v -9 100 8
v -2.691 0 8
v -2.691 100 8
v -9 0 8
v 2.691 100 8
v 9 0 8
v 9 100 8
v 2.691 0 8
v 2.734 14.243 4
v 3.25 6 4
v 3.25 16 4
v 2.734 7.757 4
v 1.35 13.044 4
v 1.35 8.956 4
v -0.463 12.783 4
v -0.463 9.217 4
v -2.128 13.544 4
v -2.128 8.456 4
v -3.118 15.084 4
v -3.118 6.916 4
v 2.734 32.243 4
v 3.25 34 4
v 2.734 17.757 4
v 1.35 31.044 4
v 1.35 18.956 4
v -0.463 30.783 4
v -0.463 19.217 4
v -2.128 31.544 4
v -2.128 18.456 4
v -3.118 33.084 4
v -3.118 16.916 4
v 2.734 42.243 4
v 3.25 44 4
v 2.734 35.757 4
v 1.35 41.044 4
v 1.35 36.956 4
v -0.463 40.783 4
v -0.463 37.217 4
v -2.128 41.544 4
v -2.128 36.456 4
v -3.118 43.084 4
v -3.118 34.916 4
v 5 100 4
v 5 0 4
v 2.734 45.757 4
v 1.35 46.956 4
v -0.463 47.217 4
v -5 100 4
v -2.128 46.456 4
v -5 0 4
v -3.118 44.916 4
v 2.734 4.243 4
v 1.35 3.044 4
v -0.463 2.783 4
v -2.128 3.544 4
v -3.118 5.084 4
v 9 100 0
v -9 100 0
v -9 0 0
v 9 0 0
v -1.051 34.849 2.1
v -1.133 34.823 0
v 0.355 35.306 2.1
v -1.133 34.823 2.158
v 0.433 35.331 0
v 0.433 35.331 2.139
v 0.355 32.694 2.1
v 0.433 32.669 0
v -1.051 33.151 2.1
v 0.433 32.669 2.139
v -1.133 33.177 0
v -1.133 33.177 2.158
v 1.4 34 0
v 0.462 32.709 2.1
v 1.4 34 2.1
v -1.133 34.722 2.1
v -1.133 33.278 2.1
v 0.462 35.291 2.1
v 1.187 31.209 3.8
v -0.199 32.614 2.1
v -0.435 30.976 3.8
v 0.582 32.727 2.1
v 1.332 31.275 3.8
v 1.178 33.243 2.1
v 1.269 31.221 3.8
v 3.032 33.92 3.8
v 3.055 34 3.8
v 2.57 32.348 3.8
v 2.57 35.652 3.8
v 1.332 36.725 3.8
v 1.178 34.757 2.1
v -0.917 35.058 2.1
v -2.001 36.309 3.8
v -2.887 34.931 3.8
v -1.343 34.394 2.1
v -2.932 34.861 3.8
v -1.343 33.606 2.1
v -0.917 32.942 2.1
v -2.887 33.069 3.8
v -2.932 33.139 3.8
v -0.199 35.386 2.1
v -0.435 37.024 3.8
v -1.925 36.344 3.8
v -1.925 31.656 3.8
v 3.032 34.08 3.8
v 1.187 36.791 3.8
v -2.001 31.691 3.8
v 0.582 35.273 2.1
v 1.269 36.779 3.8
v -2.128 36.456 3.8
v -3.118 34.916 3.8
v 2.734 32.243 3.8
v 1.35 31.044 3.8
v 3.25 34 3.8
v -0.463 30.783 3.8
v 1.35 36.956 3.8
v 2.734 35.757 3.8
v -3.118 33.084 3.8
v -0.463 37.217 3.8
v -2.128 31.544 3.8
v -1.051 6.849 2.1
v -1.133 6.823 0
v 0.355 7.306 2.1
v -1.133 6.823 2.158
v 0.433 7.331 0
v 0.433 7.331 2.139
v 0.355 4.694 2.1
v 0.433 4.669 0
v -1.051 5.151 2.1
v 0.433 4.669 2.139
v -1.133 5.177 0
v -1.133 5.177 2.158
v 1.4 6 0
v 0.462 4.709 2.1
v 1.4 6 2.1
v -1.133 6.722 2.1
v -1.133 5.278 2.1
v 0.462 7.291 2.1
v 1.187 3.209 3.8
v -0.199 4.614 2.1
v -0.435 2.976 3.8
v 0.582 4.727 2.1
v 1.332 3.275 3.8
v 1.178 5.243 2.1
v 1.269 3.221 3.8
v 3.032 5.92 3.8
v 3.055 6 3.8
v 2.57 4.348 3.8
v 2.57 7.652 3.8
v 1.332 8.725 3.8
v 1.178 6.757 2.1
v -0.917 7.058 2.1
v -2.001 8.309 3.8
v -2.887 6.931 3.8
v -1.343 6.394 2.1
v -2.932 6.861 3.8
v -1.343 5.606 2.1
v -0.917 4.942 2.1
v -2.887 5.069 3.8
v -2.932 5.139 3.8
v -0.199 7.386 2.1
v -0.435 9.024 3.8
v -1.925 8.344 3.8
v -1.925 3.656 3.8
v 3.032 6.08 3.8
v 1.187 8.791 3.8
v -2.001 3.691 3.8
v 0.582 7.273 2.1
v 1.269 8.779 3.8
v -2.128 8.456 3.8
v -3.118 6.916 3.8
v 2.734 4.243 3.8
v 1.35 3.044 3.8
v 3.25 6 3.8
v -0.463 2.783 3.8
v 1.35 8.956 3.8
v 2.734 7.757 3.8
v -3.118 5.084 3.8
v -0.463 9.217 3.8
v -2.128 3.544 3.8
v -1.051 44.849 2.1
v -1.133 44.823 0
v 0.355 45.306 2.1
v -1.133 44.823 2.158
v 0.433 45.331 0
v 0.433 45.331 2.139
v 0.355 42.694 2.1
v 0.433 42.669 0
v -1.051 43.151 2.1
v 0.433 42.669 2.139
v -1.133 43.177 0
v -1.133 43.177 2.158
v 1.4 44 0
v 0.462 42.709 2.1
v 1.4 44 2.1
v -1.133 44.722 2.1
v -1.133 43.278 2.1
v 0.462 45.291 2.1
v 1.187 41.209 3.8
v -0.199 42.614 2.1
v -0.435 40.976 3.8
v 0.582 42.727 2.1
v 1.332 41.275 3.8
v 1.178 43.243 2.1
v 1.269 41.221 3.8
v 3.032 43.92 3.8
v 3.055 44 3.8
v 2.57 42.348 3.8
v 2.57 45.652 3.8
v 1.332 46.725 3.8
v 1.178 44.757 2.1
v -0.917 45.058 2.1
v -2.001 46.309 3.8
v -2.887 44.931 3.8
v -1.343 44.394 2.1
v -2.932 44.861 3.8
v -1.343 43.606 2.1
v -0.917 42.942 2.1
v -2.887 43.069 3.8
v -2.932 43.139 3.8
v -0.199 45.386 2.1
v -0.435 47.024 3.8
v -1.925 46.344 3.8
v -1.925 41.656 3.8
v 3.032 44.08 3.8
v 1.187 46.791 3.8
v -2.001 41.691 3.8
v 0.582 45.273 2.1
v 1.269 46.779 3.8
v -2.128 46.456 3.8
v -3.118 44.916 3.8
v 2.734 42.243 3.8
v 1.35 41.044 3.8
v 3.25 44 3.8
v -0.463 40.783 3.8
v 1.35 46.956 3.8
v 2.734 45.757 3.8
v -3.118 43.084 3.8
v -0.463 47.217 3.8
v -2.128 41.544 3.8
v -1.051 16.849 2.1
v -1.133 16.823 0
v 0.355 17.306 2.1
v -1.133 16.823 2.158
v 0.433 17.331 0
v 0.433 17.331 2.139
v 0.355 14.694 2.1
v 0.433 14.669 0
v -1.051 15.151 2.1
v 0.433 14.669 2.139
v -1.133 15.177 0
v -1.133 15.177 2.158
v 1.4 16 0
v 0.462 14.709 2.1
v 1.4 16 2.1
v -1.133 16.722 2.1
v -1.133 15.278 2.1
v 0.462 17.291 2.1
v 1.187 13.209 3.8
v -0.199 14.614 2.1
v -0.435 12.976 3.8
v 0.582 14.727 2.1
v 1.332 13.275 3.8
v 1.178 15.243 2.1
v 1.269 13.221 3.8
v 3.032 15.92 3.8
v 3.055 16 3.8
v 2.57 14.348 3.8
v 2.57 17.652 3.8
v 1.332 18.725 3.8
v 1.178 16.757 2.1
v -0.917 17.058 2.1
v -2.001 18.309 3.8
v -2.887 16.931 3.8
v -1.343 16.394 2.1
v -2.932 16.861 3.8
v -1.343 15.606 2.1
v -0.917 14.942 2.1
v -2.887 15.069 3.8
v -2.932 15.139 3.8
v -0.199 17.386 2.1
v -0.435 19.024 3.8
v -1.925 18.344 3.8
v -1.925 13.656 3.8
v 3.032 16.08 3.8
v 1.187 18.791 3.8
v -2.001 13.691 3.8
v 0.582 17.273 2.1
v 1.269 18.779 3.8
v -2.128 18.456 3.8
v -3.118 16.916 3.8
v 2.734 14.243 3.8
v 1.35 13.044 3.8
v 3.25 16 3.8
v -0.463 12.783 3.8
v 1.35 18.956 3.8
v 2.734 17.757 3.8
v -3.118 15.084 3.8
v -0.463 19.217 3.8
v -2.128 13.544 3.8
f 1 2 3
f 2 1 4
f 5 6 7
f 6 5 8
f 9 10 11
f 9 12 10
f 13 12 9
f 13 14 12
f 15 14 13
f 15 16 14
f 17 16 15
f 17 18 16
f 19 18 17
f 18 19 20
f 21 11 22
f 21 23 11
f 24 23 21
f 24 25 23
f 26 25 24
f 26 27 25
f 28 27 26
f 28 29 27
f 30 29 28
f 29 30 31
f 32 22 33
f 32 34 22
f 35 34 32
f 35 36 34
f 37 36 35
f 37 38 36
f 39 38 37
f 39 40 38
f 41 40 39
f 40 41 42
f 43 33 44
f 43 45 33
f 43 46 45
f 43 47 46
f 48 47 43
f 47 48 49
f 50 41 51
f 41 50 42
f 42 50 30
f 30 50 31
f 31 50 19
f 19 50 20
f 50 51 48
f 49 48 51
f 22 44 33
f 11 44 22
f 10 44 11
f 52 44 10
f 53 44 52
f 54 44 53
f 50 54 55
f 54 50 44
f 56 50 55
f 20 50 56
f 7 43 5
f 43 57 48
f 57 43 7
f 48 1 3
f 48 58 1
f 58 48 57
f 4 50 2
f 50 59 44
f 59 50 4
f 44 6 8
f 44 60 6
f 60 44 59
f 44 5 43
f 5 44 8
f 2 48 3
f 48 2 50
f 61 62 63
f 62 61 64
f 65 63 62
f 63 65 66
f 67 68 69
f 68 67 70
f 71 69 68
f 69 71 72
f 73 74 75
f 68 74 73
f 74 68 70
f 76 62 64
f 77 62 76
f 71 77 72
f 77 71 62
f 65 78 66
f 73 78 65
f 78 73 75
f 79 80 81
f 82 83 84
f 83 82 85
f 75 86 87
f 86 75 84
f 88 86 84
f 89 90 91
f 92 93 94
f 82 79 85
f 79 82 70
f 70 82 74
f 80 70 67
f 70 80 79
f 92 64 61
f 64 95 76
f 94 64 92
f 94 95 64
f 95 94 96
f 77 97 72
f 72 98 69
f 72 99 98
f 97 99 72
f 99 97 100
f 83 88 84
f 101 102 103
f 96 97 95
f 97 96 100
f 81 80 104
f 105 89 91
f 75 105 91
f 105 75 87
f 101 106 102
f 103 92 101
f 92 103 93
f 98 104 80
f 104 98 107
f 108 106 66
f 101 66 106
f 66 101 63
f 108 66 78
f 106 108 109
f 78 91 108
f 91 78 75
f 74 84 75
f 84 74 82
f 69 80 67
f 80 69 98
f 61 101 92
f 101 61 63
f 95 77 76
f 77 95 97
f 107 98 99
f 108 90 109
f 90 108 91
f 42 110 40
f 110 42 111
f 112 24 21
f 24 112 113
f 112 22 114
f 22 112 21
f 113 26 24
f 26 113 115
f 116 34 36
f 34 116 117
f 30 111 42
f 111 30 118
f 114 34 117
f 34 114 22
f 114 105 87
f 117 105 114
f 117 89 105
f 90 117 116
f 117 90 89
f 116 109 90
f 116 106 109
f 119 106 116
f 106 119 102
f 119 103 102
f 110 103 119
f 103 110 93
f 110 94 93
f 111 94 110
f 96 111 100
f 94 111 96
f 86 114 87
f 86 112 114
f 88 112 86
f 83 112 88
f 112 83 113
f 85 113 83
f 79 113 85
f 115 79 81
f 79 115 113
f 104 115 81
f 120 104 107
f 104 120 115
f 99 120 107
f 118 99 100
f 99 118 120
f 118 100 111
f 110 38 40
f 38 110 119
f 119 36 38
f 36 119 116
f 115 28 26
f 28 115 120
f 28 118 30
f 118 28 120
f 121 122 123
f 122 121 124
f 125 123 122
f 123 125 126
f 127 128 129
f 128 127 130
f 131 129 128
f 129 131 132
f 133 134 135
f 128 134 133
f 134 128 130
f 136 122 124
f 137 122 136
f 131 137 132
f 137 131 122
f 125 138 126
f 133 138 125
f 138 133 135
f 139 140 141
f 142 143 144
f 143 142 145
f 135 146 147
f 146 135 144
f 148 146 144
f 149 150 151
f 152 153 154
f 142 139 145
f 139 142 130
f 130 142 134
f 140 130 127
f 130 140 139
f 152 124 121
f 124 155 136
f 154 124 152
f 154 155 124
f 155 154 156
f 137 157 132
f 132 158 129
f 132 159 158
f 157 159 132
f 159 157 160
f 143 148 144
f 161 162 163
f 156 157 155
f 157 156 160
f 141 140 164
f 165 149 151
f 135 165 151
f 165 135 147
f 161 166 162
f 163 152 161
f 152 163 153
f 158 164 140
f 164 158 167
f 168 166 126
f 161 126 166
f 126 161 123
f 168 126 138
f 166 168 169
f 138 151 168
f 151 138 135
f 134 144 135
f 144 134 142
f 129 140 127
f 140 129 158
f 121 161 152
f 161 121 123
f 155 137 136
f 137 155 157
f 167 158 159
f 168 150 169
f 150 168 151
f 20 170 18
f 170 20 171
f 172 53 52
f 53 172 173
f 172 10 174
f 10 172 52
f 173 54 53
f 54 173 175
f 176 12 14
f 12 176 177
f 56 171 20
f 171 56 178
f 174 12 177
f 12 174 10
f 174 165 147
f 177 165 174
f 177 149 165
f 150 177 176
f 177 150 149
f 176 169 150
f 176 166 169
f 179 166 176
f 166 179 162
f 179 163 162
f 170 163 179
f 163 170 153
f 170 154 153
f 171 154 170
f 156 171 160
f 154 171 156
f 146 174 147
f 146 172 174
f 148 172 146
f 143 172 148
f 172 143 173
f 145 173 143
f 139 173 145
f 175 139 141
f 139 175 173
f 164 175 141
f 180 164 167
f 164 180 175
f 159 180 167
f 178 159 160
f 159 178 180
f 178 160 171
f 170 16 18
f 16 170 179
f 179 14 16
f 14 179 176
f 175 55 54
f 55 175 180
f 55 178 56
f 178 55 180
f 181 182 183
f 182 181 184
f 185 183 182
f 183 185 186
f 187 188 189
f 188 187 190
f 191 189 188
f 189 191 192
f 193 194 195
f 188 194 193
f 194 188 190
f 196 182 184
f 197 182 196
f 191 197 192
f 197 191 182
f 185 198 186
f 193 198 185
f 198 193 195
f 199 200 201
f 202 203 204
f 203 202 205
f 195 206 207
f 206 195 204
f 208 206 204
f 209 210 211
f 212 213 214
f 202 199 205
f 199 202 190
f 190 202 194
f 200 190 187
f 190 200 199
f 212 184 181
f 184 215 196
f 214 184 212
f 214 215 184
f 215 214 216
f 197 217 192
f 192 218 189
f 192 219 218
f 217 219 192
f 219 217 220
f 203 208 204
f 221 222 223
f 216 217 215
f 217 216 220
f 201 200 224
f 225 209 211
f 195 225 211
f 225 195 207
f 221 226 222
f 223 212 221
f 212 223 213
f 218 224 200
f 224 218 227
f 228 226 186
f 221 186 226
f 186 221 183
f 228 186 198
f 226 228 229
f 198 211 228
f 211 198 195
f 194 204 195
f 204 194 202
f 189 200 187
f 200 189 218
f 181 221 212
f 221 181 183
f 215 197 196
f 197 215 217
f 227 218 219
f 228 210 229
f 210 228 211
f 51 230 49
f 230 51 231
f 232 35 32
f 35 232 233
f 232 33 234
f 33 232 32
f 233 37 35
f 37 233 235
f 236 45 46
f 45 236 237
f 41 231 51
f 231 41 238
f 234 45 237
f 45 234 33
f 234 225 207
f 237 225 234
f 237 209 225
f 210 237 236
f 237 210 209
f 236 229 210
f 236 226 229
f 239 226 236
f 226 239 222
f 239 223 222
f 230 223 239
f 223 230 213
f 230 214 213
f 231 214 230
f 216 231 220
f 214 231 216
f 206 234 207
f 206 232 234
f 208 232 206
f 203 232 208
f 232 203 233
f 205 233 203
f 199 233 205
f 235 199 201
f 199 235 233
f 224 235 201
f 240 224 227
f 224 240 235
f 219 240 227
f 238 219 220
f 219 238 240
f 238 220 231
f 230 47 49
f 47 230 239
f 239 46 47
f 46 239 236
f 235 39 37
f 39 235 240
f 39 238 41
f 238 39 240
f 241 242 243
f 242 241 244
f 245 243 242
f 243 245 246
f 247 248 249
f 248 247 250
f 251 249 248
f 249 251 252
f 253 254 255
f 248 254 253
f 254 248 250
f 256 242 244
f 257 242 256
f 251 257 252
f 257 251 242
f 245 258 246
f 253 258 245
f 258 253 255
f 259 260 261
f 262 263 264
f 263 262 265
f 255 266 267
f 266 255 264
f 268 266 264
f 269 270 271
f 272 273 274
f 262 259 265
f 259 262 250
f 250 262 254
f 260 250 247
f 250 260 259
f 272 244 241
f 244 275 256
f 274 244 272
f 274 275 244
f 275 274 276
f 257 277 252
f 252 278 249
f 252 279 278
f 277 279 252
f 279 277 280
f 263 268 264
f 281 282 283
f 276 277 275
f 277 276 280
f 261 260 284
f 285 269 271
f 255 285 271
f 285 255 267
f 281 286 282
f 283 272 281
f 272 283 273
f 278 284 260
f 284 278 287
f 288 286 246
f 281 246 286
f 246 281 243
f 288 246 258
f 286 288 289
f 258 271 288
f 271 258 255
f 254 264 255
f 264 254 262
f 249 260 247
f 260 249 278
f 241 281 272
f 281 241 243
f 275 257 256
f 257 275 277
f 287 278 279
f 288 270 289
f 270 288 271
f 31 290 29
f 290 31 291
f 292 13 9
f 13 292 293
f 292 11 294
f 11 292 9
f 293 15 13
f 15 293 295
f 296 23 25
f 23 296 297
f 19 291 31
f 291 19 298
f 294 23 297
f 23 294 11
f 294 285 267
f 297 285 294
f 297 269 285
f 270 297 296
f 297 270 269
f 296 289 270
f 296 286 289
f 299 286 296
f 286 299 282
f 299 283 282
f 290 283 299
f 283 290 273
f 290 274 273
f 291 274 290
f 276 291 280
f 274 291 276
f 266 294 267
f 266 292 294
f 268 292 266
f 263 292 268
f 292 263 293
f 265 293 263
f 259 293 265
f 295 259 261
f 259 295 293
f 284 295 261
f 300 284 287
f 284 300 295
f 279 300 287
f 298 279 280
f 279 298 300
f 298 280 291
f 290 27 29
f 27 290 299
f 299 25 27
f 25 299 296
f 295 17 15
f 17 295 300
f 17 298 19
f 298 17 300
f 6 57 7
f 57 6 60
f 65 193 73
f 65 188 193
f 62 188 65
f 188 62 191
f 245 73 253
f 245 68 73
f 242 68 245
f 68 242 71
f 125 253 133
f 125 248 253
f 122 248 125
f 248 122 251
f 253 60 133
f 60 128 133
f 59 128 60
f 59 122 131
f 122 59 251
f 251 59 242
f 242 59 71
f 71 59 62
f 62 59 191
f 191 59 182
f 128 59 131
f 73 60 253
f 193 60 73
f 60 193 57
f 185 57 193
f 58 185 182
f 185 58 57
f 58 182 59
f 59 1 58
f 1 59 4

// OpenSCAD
// file: common_parts.scad
include <tunable_constants.scad>;
//common_flat_screw_tap();
module M3_flat_screw(l = 10, l2 = 0) {
    // l2 is amount of the screw that are bigger for sliding through the hole
    tap_z = 1.9;
    rotate([180,0,0])
    union() {
        cylinder(d = C_M3_DIAMETER_THREAD, h= l);
        cylinder(d = C_M3_DIAMETER, h= l2);
        translate([0,0,-0.1+0.1]) cylinder(d1 = 6.5, d2= C_M3_DIAMETER_THREAD, h= tap_z);
        translate([0,0,-0.1]) cylinder(d = 6.5, h= 0.3);
    }
}

module M4_button_screw(l = 10, l2 = 0) {
    rotate([180,0,0])
    union() {
        cylinder(d = C_M4_DIAMETER_THREAD, h= l);
        cylinder(d = C_M4_DIAMETER, h= l2);
        translate([0,0,-4]) cylinder(d = 8, h=4);
    }
}
module M3_button_screw(l = 10, l2 = 0) {
    rotate([180,0,0])
    union() {
        cylinder(d = C_M3_DIAMETER_THREAD, h= l);
        cylinder(d = C_M3_DIAMETER, h= l2);
        translate([0,0,-4]) cylinder(d =6, h=4);
    }
}

module roundedcube(xdim ,ydim ,zdim,rdim){
    hull(){
        fn=30;
        translate([rdim,rdim,0]) cylinder(r=rdim, h=zdim, $fn=fn);
        translate([xdim-rdim,rdim,0])cylinder(r=rdim, h=zdim, $fn=fn);

        translate([rdim,ydim-rdim,0]) cylinder(r=rdim, h=zdim, $fn=fn);
        translate([xdim-rdim,ydim-rdim,0]) cylinder(r=rdim, h=zdim, $fn=fn);
    }
}
//beam45();
module beam45(w = 10, l = 10, h = 8) {
    difference() {
        union() {
            translate([-w/2,0,0]) cube([w,l,h]);
        }
        translate([w/2,0,0]) rotate([0,45,0])translate([-w-h,-1,0]) cube([w+h*2,l+2,h*2]);
        translate([-w/2,0,0]) rotate([0,-45,0])translate([0-w,-1,0]) cube([w+h*2,l+2,h*2]);
    }
}
//beam30();
module beam30(w = 10, l = 10, h = 8) {
    difference() {
        union() {
            translate([-w/2,0,0]) cube([w,l,h]);
        }
        translate([w/2,0,0]) rotate([0,90-30,0])translate([-w-h,-1,0]) cube([w+h*2,l+2,h*2]);
        translate([-w/2,0,0]) rotate([0,-90+30,0])translate([0-w,-1,0]) cube([w+h*2,l+2,h*2]);
    }
}


module cylinder_outer(height,radius,fn){
   fudge = 1/cos(180/fn);
   cylinder(h=height,r=radius*fudge,$fn=fn);
}

//indicator_dots(2);

module indicator_dots(valueIn) {
    for (a =[0:1:valueIn-1]) {
        translate([a*3,0,0]) cube([2,2,1]);
    }
}
// file: tunable_constants.scad
// Change parameters to fit your printer and slicer differences

C_M3_DIAMETER = 3.3; // size of a hole that a M3 screw will slide through
C_M3_DIAMETER_THREAD = 2.8; // size of a hole that a M3 screw will create own threads in

C_M3_NUT = 7;

C_KINGPIN_LOOSE = 3.5; // The hole for kingpin in the arms that are suposed to slide
C_KINGPIN_SNUG = 3.3; // The hole in the steering hub where the kingpin is suposed to be tightly locked with a screw

C_M4_NUT = 8.4;

C_M4_DIAMETER = 4.1; // size of a hole that a M4 screw will slide through
C_M4_DIAMETER_THREAD = 3.8; // size of a hole that a M4 screw will create own threads in

    b_12mm_tol = 0.3; // tolerance for bearing with 12mm diameter

C_12MM_BEARING_D = 12+b_12mm_tol; // Size of a hole that hold a 12mm bearing
C_12MM_BEARING_H = 3.5;

C_8MM_LOOSE = 8.7; // Loose fitting that will guarantie that it will not touch
C_8MM_TIGHT = 8.2; // Tight fitting for indrive etc
C_8MM_FIT = 8.5; // Perfect fit for it to be removable but not by much force, used for left wheel mount

C_SIGHT_MOUNT_S = 33.3375;

C_MOUNT1_W = 28;
// ############# Settings ################
S_CASTER = 4;
S_CAMBER = 2;

S_BAR_W = 20;
S_BAR_H = 5;
// main file
//
include <tunable_constants.scad>;
use <common_parts.scad>

// rail dimentions
r_w = 10;
r_h = 4;

wall = 4;
w = r_w+wall*2;
h = r_h+wall;
l = 100;

// mounting to sight part
c_h = 10;
c_w = 40;


//prim_base_p();
stick();
module prim_base_p() {
    difference() {
        union() {
            translate([0,0,0]) rotate([0,0,90]) rotate([0,90,0]) stick();
            translate([-20,-20,0]) roundedcube(c_w,20,c_h,3);
        }
        screws();
        translate([-20,-28,0]) cube([c_w,20,c_h]);
    }
}

module stick() {
    difference() {
        union() {
            translate([-w/2,0,0]) cube([w,l,h]);
            
        }
        translate([0,0,wall]) beam30(w=r_w, l=l, h=r_h);
        screws();
    }
}

%screws();
module screws() {

    translate([0,20+C_MOUNT1_W/2,wall]) rotate([0,0,0]) M3_flat_screw(l=30,l2=0);
    translate([0,20-C_MOUNT1_W/2,wall]) rotate([0,0,0]) M3_flat_screw(l=30,l2=0);
    
    translate([0,30+C_MOUNT1_W/2,wall]) rotate([0,0,0]) M3_flat_screw(l=30,l2=0);
    translate([0,30-C_MOUNT1_W/2,wall]) rotate([0,0,0]) M3_flat_screw(l=30,l2=0);
}
